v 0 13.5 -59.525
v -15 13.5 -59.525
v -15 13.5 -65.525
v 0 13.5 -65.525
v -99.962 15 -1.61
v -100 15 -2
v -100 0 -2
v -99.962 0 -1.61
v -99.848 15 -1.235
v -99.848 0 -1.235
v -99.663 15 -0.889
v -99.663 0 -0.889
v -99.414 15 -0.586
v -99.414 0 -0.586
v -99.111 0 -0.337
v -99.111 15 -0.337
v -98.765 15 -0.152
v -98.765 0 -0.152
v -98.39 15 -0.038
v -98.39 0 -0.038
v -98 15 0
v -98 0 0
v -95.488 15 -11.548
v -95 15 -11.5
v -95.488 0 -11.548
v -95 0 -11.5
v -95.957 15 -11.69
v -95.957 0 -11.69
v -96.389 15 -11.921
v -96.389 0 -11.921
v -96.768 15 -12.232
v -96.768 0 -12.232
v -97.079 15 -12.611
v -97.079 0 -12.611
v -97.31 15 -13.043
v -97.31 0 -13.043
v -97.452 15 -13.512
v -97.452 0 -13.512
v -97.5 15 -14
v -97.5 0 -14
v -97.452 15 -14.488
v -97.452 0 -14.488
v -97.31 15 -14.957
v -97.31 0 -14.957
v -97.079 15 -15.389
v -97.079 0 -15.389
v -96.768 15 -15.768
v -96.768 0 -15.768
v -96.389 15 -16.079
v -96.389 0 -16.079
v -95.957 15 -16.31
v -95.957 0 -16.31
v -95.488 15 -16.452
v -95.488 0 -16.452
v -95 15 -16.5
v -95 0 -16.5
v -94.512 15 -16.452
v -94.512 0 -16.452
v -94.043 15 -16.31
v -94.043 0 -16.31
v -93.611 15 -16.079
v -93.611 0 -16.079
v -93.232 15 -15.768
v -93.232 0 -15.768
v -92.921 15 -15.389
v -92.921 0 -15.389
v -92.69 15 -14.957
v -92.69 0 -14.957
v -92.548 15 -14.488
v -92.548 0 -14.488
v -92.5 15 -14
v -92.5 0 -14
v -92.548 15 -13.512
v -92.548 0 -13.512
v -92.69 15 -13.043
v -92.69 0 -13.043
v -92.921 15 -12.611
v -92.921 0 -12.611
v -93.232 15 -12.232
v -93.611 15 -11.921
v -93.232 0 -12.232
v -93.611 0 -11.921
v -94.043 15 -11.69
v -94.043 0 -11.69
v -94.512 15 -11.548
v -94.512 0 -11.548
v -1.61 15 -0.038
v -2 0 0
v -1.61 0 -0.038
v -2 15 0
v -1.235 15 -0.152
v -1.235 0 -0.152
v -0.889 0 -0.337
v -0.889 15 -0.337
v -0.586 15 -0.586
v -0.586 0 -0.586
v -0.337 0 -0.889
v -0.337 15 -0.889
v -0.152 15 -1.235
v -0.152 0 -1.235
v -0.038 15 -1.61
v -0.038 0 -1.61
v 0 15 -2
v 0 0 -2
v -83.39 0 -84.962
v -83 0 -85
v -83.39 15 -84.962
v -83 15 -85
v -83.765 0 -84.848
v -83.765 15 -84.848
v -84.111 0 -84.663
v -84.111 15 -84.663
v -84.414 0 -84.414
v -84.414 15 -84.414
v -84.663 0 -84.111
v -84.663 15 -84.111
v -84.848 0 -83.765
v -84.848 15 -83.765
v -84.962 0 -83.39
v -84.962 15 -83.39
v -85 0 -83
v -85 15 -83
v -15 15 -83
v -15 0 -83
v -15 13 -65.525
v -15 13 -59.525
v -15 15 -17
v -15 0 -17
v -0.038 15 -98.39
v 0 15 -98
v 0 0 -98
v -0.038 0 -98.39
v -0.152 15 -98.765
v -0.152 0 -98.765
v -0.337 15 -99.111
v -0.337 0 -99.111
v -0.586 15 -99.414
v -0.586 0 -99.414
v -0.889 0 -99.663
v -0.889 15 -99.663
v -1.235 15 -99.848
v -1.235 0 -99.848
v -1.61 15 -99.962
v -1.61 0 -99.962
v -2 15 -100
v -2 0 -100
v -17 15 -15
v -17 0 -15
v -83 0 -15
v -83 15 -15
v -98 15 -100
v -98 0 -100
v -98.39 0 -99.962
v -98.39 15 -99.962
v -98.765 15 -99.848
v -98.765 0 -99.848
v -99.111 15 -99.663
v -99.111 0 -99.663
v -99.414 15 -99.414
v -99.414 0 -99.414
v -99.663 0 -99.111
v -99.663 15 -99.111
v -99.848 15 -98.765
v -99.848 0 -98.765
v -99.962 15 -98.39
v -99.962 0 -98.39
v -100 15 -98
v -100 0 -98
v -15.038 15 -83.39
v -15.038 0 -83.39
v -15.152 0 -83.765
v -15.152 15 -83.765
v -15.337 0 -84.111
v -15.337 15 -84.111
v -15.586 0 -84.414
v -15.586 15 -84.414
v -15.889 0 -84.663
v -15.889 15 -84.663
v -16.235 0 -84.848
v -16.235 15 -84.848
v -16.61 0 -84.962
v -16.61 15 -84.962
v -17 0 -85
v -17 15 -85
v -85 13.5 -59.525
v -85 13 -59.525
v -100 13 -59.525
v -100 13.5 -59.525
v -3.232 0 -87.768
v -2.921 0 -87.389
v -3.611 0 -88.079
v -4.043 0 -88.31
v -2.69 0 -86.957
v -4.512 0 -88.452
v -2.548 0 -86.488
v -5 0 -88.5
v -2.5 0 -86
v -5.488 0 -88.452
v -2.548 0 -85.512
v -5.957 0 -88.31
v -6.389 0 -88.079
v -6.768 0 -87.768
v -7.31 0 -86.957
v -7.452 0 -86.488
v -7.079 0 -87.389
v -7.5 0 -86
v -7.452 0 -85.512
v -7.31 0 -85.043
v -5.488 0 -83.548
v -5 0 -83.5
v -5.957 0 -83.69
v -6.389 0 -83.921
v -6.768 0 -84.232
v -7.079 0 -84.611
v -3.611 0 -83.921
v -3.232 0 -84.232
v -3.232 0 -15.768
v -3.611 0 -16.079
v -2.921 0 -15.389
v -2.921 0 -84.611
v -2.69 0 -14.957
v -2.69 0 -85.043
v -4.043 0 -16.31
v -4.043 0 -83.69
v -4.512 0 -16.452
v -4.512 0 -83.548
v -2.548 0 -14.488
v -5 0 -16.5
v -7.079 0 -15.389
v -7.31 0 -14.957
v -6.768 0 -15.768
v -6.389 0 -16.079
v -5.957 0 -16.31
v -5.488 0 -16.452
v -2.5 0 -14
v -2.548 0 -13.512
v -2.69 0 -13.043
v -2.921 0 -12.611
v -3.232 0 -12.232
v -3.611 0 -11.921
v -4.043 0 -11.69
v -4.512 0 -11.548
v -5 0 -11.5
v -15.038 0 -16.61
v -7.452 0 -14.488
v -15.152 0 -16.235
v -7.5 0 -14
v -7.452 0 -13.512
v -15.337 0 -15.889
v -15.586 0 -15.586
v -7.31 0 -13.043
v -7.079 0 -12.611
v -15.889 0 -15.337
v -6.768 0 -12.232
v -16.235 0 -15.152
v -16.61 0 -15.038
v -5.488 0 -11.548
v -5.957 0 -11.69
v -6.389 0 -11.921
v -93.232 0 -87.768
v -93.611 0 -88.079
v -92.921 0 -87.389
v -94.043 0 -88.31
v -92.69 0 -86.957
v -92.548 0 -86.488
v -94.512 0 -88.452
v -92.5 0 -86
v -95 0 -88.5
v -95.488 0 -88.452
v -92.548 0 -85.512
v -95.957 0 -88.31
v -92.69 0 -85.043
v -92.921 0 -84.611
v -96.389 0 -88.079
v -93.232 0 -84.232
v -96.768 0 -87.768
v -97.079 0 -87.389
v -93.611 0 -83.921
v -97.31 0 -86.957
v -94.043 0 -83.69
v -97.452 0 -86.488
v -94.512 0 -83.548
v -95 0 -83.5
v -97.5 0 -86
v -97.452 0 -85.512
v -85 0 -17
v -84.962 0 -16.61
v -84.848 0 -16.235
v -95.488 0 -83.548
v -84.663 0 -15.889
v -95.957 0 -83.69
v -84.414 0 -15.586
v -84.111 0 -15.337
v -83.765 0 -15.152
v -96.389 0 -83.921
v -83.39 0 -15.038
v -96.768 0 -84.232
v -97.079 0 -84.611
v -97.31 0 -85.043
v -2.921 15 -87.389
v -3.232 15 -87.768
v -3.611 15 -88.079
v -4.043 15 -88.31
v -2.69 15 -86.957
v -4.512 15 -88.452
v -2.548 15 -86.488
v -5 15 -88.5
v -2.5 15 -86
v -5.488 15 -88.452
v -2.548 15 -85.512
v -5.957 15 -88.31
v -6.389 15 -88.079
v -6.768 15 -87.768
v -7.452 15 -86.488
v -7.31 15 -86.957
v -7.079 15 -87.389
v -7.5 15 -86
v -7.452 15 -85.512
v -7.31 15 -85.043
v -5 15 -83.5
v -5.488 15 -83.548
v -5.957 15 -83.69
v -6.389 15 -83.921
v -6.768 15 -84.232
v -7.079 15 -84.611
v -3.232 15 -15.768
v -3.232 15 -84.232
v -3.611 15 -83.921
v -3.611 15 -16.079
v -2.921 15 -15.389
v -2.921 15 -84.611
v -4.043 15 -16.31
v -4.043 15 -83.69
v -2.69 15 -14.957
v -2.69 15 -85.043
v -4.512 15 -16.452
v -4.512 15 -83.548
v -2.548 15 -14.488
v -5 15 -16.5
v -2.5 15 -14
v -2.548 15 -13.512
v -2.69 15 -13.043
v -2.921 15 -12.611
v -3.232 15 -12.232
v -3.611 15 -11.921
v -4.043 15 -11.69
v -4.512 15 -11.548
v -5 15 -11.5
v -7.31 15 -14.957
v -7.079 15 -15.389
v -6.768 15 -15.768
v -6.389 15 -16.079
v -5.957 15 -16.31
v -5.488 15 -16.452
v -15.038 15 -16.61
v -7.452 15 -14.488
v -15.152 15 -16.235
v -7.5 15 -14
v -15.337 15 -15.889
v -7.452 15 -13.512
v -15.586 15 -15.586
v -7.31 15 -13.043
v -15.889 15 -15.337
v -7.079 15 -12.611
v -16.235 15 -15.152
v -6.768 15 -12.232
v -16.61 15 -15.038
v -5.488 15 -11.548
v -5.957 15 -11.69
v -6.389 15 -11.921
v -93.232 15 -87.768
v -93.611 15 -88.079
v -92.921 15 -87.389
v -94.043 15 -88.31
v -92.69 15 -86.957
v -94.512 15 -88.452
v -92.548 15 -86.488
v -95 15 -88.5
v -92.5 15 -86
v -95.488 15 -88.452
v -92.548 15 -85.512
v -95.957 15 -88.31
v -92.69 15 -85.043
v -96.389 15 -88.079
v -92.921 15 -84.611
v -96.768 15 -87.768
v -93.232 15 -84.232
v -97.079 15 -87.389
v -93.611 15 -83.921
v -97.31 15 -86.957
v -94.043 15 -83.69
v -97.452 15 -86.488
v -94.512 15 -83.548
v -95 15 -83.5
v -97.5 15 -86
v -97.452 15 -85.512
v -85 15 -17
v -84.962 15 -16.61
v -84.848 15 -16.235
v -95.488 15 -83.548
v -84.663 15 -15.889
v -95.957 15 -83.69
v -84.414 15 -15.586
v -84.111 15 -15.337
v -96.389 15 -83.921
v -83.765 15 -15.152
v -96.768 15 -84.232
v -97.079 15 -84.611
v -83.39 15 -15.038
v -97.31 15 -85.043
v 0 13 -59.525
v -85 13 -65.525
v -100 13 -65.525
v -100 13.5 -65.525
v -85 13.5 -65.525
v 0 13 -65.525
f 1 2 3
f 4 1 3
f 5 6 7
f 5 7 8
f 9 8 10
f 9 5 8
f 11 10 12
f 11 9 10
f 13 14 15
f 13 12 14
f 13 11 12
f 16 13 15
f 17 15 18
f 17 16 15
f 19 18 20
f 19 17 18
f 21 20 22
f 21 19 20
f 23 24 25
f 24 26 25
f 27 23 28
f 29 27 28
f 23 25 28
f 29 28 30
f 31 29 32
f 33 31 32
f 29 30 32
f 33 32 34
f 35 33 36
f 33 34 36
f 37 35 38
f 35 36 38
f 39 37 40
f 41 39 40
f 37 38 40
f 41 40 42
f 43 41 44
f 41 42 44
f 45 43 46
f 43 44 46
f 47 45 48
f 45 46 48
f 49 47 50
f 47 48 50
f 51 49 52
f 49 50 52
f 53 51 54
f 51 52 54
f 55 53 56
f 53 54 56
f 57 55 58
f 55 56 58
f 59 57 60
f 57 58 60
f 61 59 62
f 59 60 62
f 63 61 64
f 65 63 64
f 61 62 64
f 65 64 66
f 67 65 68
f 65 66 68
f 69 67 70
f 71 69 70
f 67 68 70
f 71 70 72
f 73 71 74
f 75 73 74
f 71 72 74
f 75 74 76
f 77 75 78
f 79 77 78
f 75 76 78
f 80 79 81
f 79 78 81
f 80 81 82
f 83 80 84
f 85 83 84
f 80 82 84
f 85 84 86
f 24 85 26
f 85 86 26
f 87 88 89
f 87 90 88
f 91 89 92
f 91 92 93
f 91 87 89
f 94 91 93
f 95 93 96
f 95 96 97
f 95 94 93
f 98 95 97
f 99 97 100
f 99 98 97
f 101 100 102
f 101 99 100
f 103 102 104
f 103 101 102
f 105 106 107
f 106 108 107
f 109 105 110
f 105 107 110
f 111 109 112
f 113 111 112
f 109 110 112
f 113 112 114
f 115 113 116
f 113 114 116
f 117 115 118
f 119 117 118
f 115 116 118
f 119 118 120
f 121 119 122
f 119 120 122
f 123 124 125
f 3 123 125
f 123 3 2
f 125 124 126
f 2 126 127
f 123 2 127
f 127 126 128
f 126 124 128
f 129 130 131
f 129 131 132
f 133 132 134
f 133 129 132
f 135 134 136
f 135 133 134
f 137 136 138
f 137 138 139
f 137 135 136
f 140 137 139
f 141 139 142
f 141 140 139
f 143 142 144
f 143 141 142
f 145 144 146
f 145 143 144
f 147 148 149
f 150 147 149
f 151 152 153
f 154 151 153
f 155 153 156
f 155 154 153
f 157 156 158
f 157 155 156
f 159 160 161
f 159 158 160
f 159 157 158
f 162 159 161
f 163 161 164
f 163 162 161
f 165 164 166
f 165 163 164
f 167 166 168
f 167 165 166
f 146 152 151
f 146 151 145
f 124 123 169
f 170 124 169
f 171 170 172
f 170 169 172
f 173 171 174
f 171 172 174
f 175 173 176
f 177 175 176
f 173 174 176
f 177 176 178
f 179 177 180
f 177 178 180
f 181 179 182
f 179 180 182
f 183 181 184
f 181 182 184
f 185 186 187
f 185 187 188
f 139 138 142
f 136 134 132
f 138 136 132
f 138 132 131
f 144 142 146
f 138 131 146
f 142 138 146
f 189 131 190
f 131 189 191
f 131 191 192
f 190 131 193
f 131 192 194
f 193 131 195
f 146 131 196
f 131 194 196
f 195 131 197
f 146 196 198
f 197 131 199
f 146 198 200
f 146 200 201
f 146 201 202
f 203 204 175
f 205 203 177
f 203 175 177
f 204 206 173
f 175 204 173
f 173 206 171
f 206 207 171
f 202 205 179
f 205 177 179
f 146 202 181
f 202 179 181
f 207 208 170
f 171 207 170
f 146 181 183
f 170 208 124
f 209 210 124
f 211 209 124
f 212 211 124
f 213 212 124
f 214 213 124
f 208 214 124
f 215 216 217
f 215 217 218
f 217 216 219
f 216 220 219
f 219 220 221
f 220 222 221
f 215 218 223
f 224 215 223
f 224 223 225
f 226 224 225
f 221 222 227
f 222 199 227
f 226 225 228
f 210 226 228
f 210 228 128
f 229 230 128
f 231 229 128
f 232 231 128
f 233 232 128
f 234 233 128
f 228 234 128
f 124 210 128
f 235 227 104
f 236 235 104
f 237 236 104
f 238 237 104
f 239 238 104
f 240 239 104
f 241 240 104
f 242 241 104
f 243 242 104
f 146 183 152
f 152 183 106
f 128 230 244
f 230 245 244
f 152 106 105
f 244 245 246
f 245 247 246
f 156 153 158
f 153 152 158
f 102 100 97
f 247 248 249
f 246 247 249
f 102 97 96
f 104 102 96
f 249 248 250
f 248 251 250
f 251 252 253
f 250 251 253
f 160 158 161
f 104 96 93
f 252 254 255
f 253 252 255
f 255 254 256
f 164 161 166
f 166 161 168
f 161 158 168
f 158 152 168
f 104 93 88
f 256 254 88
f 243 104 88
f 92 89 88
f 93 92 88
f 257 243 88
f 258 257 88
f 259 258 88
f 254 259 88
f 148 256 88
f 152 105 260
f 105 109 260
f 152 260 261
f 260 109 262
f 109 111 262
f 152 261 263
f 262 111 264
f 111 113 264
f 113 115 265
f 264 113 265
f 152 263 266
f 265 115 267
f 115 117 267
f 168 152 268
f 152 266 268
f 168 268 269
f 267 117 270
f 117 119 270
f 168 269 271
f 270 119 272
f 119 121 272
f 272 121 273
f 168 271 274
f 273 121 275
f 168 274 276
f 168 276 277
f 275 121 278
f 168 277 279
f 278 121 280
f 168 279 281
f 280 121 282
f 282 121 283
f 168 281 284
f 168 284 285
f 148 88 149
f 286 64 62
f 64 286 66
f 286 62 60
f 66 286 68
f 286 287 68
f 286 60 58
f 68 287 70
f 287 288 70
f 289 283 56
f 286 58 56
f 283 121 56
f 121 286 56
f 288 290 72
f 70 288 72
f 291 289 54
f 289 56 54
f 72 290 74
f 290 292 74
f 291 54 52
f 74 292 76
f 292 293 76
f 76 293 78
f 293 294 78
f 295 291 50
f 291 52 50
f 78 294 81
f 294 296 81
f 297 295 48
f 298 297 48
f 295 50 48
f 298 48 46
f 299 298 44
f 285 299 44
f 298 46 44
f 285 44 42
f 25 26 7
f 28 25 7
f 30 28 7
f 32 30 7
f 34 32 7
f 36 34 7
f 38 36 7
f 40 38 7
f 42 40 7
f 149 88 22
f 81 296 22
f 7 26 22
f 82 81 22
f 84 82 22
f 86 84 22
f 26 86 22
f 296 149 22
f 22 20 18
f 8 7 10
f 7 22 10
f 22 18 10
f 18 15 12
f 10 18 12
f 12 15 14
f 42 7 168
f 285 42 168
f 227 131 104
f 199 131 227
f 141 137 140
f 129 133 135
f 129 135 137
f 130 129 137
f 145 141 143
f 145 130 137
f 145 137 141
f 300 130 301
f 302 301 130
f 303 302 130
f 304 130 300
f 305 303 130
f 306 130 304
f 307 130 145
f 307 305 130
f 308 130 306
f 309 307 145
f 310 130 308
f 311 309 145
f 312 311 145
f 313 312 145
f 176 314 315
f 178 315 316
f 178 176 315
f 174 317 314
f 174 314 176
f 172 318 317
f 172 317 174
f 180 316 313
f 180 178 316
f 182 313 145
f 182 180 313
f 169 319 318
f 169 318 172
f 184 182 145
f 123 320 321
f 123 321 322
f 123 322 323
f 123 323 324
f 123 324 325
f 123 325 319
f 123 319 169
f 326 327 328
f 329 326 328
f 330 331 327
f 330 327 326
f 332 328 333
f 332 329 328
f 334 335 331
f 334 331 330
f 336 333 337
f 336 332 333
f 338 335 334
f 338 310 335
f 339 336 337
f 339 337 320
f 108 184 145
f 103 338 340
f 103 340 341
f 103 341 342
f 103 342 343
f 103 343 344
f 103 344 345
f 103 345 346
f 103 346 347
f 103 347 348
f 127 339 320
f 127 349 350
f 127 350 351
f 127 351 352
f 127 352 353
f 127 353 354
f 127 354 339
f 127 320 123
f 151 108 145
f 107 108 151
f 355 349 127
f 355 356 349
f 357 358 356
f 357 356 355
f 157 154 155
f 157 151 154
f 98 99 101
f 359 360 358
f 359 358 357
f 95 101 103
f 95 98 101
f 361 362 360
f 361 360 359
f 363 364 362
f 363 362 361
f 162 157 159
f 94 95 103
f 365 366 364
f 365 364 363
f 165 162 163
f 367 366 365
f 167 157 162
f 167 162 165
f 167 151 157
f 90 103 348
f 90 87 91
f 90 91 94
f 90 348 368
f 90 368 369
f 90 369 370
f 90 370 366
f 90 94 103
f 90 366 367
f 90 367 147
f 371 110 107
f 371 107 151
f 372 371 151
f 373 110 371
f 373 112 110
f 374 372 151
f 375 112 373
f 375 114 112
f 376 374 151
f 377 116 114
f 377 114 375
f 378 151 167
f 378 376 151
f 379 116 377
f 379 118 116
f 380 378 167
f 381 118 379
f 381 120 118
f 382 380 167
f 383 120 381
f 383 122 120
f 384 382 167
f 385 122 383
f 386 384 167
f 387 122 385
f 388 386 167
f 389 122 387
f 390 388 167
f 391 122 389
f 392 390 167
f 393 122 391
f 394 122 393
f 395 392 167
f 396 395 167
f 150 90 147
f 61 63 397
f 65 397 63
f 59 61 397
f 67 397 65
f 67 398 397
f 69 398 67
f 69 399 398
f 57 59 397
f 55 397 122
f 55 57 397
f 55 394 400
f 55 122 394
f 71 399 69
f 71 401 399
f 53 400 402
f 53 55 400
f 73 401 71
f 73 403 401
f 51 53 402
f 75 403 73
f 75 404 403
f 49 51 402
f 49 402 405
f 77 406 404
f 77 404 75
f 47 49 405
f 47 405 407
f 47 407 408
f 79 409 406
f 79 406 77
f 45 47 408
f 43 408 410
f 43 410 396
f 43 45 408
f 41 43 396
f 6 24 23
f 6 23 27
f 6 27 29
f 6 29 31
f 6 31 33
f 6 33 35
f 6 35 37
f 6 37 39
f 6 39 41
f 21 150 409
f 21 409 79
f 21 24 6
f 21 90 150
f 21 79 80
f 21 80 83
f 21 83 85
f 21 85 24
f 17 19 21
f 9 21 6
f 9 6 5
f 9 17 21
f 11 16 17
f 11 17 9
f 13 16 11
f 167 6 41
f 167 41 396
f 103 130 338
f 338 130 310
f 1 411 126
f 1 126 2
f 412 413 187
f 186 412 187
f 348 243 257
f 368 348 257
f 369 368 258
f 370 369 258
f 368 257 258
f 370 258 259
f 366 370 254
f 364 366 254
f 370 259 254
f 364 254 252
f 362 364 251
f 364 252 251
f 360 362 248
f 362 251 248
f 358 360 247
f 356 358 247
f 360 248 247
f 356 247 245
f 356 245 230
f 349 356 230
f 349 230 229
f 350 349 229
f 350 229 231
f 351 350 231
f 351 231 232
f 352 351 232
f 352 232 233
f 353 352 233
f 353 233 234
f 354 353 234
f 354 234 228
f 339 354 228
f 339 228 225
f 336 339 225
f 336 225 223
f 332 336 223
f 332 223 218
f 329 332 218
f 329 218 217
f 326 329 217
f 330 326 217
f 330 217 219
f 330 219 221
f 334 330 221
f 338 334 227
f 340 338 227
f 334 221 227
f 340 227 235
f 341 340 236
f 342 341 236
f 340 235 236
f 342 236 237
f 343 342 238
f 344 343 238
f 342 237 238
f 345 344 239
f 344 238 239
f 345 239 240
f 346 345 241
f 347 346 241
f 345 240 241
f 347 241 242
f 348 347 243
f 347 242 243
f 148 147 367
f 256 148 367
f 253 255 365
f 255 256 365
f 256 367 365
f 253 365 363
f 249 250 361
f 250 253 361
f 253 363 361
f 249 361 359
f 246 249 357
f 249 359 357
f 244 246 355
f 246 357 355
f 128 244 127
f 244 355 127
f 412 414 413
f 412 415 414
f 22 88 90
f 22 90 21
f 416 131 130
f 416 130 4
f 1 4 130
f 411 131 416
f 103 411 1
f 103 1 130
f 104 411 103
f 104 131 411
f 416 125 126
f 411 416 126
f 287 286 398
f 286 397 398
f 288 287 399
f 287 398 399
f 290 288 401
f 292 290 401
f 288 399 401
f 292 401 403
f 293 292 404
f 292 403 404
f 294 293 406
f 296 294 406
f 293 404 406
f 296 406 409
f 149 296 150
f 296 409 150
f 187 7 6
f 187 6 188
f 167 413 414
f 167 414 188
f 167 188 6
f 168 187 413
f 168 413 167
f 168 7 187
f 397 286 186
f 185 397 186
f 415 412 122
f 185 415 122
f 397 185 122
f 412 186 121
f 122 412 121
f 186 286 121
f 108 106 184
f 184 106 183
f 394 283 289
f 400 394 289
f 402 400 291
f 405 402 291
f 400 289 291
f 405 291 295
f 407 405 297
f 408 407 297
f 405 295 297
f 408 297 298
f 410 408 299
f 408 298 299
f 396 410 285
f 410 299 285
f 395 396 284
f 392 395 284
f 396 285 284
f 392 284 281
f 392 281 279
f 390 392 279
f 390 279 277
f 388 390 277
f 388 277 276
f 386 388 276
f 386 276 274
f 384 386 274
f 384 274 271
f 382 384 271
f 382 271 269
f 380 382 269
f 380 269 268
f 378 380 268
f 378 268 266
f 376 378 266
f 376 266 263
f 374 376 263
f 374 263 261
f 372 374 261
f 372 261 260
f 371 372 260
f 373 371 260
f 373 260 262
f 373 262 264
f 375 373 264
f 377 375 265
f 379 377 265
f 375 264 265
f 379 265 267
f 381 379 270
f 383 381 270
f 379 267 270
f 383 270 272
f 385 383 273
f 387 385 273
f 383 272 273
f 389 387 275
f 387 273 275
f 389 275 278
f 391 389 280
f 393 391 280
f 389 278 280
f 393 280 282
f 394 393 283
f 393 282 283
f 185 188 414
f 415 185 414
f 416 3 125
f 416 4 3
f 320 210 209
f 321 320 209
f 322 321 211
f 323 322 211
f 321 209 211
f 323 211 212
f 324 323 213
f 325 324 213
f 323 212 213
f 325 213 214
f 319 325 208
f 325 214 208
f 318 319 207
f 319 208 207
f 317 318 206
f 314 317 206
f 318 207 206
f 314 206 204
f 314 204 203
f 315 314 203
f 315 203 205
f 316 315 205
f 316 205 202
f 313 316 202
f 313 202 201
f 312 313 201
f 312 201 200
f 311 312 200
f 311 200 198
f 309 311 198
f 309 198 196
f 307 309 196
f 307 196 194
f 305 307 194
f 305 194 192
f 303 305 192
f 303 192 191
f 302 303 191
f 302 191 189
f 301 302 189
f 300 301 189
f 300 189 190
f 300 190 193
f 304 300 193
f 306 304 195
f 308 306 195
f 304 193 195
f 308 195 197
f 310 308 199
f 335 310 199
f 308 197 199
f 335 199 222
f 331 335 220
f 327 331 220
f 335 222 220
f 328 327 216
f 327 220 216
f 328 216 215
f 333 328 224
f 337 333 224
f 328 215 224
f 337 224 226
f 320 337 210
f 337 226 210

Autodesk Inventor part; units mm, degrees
ref_plane "YZ Plane" through (0, 0, 0) normal (1, 0, 0) x (0, 1, 0)
ref_plane "XZ Plane" through (0, 0, 0) normal (0, 1, 0) x (-1, 0, 0)
ref_plane "XY Plane" through (0, 0, 0) normal (0, 0, 1) x (1, 0, 0)
sketch "Szkic1" plane through (0, 0, 0) normal (0, 1, 0) x (-1, 0, 0)
  line L0 (0, 0) -> (100, 0)
  line L1 (100, 0) -> (100, -100)
  line L2 (100, -100) -> (0, -100)
  line L3 (0, -100) -> (0, 0)
  dimension "d0" = 100
  dimension "d1" = 100
sketch "Szkic2" plane through (0, 0, 0) normal (0, 1, 0) x (-1, 0, 0)
  line L0 (15, -15) -> (85, -15)
  line L1 (85, -15) -> (85, -85)
  line L2 (85, -85) -> (15, -85)
  line L3 (15, -85) -> (15, -15)
  point P0 (0, 0)
  dimension "d2" = 70
  dimension "d3" = 70
  dimension "d4" = 15
  dimension "d5" = 15
extrude "Wyciągnięcie proste1" add sketch "Szkic1" along normal blind 15
extrude "Wyciągnięcie proste2" cut sketch "Szkic2" along normal blind 15
fillet "Zaokrąglenie1" radius 2 8 edges at (-85, 7.5, -85) (-15, 7.5, -85) (-15, 7.5, -15) (-85, 7.5, -15) (-100, 7.5, 0) (-100, 7.5, -100) (0, 7.5, -100) (0, 7.5, 0)
sketch "Szkic3" plane through (0, 15, 0) normal (0, 1, 0) x (1, 0, 0)
  line L0 (0, 2) -> (0, 98) projected
  line L1 (-2, 100) -> (-98, 100) projected
  line L2 (-98, 0) -> (-2, 0) projected
  line L3 (-100, 98) -> (-100, 2) projected
  point P0 (0, 0)
  point P1 (-5, 86)
  point P2 (-5, 14)
  point P3 (-95, 86)
  point P4 (-95, 14)
  dimension "d11" = 5
  dimension "d12" = 14
  dimension "d13" = 14
  dimension "d14" = 14
  dimension "d15" = 5
  dimension "d16" = 5
  dimension "d17" = 5
  dimension "d18" = 14
hole "Otwór1" at (-5, 15, -86) at (-5, 15, -14) at (-95, 15, -86) at (-95, 15, -14) direction (0, -1, 0) diameter 5 depth 15 clearance for "Śruba ze łbem płaskim obrobiona" size "M4" standard "ANSI Profil metryczny M"
sketch "Szkic4" plane through (0, 15, 0) normal (0, 1, 0) x (1, 0, 0)
  point P0 (0, 0)
sketch "Szkic5" plane through (0, 0, -2) normal (1, 0, 0) x (0, 0, -1)
  line L0 (57.525, 13.5) -> (63.525, 13.5)
  line L1 (63.525, 13.5) -> (63.525, 13)
  line L2 (63.525, 13) -> (57.525, 13)
  line L3 (57.525, 13) -> (57.525, 13.5)
  line L4 (0, 15) -> (96, 15) projected
  line L5 (98, 0) -> (98, 15) projected
  point P0 (-2, 0)
  point P1 (63.525, 13.25)
  dimension "d26" = 6
  dimension "d27" = 0.5
  dimension "d28" = 1.5
  dimension "d29" = 34.475
extrude "Wyciągnięcie proste3" cut sketch "Szkic5" against normal through all
equation "\"d1\" = d0"
equation "\"d13\" = d12"
equation "\"d14\" = d12"
equation "\"d15\" = d11"
equation "\"d16\" = d11"
equation "\"d17\" = d11"
equation "\"d18\" = d12"
properties part number "podstawka_prowadzaca"
